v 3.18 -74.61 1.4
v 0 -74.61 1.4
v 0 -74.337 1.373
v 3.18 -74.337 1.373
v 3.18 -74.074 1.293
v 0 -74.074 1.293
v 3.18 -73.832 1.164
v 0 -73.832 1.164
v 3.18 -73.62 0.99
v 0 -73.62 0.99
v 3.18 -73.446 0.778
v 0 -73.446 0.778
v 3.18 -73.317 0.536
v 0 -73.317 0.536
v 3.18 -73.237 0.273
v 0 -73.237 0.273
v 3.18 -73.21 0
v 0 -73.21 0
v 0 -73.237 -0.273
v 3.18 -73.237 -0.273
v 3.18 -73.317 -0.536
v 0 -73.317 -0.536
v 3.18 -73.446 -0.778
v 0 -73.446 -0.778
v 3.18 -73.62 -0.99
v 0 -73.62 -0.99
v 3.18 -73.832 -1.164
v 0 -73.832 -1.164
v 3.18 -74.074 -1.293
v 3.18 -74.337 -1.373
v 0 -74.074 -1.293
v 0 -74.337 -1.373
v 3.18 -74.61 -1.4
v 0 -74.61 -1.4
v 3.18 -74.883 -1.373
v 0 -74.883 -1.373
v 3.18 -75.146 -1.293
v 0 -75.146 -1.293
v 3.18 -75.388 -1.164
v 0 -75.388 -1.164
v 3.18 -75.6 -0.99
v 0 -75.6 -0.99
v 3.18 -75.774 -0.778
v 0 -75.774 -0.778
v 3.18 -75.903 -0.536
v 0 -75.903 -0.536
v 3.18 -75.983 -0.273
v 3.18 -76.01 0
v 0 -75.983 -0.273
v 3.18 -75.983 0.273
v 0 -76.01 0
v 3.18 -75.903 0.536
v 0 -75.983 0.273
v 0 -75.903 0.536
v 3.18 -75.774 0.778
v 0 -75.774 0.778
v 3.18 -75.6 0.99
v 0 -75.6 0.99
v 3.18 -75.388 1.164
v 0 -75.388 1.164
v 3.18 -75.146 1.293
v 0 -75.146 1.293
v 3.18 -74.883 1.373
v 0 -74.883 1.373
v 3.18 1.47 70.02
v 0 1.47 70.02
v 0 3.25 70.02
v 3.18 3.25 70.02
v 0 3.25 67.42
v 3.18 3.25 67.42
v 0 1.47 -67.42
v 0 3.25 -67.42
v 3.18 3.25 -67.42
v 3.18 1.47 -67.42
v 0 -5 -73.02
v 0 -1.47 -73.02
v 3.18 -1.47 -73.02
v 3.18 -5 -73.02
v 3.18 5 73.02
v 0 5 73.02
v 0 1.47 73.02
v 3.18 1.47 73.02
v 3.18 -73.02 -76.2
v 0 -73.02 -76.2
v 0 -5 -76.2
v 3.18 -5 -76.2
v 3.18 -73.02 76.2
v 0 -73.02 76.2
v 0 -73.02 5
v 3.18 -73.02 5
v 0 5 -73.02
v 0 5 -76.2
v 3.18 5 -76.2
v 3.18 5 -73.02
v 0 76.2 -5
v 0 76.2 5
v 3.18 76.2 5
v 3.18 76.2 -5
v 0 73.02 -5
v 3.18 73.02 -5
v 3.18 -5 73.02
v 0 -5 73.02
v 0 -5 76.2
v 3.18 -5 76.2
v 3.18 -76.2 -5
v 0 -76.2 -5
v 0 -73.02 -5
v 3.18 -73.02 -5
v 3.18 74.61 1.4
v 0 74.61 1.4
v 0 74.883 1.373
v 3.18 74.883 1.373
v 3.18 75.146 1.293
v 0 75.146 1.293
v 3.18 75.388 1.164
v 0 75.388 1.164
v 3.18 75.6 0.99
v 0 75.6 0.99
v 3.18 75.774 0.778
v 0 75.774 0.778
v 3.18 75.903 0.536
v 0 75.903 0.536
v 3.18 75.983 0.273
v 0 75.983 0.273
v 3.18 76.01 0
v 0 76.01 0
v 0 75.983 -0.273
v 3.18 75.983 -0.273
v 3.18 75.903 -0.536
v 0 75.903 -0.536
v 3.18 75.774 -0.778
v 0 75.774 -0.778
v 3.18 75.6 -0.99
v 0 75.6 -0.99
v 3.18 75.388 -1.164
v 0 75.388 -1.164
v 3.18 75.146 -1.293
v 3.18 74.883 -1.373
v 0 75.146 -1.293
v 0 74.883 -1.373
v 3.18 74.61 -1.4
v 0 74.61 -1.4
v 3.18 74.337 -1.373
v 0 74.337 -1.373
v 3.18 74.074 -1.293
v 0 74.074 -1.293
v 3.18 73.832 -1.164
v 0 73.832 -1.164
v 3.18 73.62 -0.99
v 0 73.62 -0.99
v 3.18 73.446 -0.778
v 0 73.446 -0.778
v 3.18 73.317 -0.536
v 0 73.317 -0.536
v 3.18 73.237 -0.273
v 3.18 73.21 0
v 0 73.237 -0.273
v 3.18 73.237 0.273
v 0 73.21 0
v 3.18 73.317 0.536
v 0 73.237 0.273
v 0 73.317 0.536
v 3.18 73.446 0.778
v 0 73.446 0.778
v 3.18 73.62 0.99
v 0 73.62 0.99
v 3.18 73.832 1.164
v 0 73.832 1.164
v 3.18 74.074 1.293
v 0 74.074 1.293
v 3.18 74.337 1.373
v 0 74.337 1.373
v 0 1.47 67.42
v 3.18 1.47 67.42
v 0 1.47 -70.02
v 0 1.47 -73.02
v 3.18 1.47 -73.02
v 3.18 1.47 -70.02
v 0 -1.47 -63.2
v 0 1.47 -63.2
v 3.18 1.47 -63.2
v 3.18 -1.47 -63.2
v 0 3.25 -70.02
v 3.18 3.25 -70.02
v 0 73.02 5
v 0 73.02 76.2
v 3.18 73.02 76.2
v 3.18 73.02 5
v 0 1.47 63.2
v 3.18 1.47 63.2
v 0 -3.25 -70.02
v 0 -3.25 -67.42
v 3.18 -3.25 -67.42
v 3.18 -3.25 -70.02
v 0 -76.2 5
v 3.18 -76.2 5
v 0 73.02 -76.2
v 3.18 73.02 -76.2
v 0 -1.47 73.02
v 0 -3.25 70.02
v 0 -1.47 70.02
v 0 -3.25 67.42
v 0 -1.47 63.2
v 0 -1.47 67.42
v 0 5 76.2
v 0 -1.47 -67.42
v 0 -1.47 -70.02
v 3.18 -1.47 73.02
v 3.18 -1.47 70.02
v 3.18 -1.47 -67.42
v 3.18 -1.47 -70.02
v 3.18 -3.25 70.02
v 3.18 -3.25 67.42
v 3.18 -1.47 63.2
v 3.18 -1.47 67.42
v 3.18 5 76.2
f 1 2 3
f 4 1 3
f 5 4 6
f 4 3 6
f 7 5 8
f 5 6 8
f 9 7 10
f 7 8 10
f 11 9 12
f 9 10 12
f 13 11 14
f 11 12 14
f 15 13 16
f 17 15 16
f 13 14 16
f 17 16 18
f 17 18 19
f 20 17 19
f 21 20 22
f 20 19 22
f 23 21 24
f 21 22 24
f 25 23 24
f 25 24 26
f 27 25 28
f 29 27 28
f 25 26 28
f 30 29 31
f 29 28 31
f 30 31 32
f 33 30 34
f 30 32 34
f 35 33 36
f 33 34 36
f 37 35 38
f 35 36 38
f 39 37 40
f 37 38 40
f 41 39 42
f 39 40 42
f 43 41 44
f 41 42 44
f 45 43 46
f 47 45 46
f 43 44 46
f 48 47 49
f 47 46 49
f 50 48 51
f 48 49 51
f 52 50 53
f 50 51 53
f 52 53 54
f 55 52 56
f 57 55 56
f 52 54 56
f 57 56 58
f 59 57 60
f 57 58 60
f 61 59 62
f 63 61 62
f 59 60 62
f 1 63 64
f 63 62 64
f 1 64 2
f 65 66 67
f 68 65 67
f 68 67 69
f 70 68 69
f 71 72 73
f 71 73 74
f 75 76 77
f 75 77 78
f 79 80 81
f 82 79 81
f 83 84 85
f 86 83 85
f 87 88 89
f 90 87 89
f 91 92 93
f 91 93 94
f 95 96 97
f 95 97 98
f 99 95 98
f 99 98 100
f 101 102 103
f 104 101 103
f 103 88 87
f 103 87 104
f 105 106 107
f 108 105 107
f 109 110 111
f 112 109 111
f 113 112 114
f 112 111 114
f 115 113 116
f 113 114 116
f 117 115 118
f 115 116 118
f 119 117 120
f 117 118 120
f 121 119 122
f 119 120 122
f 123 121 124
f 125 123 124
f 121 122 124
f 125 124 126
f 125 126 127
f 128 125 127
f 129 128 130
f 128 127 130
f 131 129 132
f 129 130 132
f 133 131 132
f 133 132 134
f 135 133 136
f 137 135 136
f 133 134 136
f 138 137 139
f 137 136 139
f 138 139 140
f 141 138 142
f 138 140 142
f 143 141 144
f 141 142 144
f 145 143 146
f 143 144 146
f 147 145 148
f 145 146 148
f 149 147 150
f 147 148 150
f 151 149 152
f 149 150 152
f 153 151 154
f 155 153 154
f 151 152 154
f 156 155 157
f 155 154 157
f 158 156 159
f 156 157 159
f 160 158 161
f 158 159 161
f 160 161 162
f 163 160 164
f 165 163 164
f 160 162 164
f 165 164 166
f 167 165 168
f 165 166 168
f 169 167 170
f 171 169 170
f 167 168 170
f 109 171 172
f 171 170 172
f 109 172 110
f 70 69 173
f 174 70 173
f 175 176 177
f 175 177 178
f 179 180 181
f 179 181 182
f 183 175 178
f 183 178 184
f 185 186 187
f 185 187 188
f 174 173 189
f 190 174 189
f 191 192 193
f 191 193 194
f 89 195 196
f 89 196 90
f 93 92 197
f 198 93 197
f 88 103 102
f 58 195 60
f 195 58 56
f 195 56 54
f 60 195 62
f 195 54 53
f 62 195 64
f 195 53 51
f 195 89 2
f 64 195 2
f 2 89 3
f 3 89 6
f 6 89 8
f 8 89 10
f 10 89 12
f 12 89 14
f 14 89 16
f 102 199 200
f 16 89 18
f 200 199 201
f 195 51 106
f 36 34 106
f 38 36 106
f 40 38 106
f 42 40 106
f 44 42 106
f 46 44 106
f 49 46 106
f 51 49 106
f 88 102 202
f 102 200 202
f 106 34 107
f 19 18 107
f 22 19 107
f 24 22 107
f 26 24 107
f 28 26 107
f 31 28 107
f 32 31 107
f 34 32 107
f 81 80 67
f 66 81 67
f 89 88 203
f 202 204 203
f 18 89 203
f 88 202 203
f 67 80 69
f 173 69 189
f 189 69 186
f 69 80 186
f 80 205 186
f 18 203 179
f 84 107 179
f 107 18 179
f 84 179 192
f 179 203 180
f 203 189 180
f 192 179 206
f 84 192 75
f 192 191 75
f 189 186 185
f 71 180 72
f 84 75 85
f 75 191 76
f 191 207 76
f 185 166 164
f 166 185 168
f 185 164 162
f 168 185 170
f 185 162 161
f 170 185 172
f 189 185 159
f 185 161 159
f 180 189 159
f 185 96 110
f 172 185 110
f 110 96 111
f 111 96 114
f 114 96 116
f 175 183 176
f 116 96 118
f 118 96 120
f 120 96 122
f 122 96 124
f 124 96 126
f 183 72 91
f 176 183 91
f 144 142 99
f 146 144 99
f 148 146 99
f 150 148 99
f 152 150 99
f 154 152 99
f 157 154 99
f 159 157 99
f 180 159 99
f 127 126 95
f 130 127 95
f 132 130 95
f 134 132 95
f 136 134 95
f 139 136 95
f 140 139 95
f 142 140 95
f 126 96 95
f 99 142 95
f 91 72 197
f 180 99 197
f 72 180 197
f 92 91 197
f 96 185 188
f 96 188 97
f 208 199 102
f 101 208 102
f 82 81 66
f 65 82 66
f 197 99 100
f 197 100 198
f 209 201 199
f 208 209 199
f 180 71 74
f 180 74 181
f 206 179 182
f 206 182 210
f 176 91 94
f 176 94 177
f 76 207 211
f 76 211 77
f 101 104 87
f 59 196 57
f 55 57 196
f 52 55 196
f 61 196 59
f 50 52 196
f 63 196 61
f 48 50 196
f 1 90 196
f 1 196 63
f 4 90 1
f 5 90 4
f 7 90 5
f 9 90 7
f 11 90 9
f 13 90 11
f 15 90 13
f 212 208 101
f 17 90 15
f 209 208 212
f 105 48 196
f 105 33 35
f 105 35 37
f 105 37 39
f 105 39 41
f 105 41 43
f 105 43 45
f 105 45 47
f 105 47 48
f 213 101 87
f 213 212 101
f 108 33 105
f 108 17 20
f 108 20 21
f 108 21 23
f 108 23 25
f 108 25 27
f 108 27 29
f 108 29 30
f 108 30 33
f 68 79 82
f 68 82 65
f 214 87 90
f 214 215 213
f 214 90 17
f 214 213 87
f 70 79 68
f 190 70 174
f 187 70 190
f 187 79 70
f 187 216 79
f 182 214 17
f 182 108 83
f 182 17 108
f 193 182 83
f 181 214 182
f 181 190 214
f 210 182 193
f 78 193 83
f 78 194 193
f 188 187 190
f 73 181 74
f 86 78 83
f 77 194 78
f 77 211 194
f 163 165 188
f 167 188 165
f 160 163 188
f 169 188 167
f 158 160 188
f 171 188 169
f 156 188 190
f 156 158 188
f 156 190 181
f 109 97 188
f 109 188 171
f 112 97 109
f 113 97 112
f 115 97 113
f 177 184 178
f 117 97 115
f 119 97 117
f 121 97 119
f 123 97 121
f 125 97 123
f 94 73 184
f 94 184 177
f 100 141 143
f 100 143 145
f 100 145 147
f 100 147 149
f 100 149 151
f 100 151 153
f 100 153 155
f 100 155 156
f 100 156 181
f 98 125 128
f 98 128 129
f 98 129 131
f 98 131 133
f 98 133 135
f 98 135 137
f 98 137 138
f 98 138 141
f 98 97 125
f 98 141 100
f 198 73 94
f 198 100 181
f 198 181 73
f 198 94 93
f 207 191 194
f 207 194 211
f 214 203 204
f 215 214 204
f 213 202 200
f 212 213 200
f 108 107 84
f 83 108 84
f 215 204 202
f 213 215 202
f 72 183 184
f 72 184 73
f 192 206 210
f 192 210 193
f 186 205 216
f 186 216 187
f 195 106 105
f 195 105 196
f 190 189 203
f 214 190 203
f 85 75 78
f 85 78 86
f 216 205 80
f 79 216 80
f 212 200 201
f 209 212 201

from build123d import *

# Parameters (mm, degrees)
SKETCH1_W           = 152.4
SKETCH1_H           = 146.04
BOSS_EXTRUDE1_DEPTH = 3.18
SKETCH3_R           = 1.4
SKETCH3_W           = 10
SKETCH3_H           = 3.18
BOSS_EXTRUDE5_DEPTH = 3.18
CUT_EXTRUDE2_DEPTH  = 4.18
CUT_EXTRUDE3_DEPTH  = 4.18


with BuildPart() as part:
    # Sketch1 → Boss-Extrude1 (new body)
    with BuildSketch(Plane(origin=(0, 0, 0), x_dir=(0, 0, -1), z_dir=(1, 0, 0))):
        Rectangle(SKETCH1_W, SKETCH1_H)
    extrude(amount=BOSS_EXTRUDE1_DEPTH)

    # Sketch3 → Boss-Extrude5 (add)
    with BuildSketch(Plane.ZY):
        Polygon((0, 73.02), (5, 73.02), (5, 76.2), (-5, 76.2), (-5, 73.02), align=None)
        with Locations((0, 74.61)):
            Circle(SKETCH3_R, mode=Mode.SUBTRACT)
        with Locations((0, -74.61)):
            Rectangle(SKETCH3_W, SKETCH3_H)
        with Locations((0, -74.61)):
            Circle(SKETCH3_R, mode=Mode.SUBTRACT)
    extrude(amount=-BOSS_EXTRUDE5_DEPTH)

    # Sketch4 → Cut-Extrude2 (cut, through all)
    with BuildSketch(Plane(origin=(0, 0, 0), x_dir=(0, 0, -1), z_dir=(1, 0, 0))):
        Polygon((-76.2, -5), (-76.2, 5), (-73.02, 5), (-73.02, 1.47), (-70.02, 1.47), (-70.02, 3.25), (-67.42, 3.25), (-67.42, 1.47), (-63.2, 1.47), (-63.2, -1.47), (-67.42, -1.47), (-67.42, -3.25), (-70.02, -3.25), (-70.02, -1.47), (-73.02, -1.47), (-73.02, -5), align=None)
    extrude(amount=CUT_EXTRUDE2_DEPTH, mode=Mode.SUBTRACT)

    # Sketch5 → Cut-Extrude3 (cut, through all)
    with BuildSketch(Plane.ZY):
        Polygon((-70.02, -1.47), (-73.02, -1.47), (-73.02, -5), (-76.2, -5), (-76.2, 5), (-73.02, 5), (-73.02, 1.47), (-70.02, 1.47), (-70.02, 3.25), (-67.42, 3.25), (-67.42, 1.47), (-63.2, 1.47), (-63.2, -1.47), (-67.42, -1.47), (-67.42, -3.25), (-70.02, -3.25), align=None)
    extrude(amount=-CUT_EXTRUDE3_DEPTH, mode=Mode.SUBTRACT)


solid = part.part
